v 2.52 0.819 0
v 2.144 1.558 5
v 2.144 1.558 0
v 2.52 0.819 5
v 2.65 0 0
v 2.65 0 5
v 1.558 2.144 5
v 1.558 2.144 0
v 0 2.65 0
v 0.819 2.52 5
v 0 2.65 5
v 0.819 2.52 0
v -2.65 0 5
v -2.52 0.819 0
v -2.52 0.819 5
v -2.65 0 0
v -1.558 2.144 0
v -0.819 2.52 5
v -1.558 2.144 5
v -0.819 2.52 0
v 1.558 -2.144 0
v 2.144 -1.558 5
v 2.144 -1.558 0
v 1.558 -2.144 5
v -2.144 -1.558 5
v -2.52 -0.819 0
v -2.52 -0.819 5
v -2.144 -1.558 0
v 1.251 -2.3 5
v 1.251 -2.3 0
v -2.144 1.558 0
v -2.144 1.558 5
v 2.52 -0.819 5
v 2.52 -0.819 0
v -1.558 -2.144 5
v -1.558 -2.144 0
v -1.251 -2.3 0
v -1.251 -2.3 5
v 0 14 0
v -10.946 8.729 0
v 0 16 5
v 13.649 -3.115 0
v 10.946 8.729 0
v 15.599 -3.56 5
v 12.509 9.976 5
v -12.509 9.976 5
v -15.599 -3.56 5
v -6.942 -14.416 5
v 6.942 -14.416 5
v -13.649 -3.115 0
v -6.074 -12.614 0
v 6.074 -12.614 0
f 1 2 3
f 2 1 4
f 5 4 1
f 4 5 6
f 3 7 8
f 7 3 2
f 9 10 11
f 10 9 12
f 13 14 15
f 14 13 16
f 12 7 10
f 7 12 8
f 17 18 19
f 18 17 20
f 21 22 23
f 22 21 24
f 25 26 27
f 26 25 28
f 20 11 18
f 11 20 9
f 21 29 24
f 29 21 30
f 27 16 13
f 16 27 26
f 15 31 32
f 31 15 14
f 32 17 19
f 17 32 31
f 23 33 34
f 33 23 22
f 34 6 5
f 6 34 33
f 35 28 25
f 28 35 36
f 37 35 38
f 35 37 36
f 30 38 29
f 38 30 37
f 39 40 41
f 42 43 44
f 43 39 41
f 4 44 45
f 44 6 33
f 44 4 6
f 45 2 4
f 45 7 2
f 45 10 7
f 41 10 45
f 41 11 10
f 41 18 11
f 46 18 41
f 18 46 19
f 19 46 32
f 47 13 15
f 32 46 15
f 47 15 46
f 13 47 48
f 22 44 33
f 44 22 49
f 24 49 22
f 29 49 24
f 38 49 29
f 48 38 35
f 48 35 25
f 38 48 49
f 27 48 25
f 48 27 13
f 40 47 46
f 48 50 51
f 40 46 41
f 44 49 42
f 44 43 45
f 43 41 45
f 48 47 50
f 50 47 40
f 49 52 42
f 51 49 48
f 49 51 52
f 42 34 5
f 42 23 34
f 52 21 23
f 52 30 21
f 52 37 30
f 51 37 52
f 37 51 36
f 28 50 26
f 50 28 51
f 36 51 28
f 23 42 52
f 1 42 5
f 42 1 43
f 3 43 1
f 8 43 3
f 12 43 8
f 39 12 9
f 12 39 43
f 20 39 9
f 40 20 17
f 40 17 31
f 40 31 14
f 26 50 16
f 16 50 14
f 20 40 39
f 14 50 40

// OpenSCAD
/*
Knob Factory

Version 1.2

Published at https://www.thingiverse.com/thing:4708988

© 2012 Steve Cooley    ( http://sc-fa.com , http://beatseqr.com , http://hapticsynapses.com )
© 2021 Matthias Ansorg ( https://ma.juii.net )

Description
===========
A parametric OpenSCAD design that allows to generate all kinds of knobs. Examples: small knobs for potentiometer inputs; 
knobs for turning the extruder or an axis of the 3D printer manually; water spout knobs etc.. It's a good idea to print 
only the lower 5 mm at first and then abort the print, to test if the hole diamater fits well on the shaft or if the measures 
have to be tuned further.

Licence
=======
Knob Factory is licensed under a Creative Commons Attribution 3.0 Unported License according to 
the licence note found at https://www.thingiverse.com/thing:20513 . Based on a work at sc-fa.com. 
Permissions beyond the scope of this license may be available at http://sc-fa.com/blog/contact .
You can view the terms of the license here: http://creativecommons.org/licenses/by/3.0/

Version History
===============
1.2  2021-01-03  Option to generate knobs with stems. Major refactorings. Republished as remix on Thingiverse.
1.1  2012-04-12  Fixed the arrow indicator code to be more robust and easier to adjust parameters for.
1.0  2012-03-??  Initial release at https://www.thingiverse.com/thing:20513 .

Open Tasks
==========
* @todo Adjust $fn based on the quality parameter so that if ≥30 faces on the circumference are specified, the shape 
    will be made "round", using the current quality setting.
* @todo Change the assembly order so that the external indicator is not cut by the cone indents even if they cut to the very bottom.
* @todo Add a horizontal cylinder around the setscrew hole, providing sufficient thread length where thin stems walls don't.
* @todo Add support for melt-in nuts that can be used for the setscrew hole, as seen at https://www.thingiverse.com/thing:3475324
* @todo Provide an option to chamfer rather than round along the top, to allow printing without support when flipped over.
* @todo Refactor the top_rounding() module.
* @todo Make the top_rounding() operation faster. Everything else is already fast enough to navigate fluently in preview mode.
* @todo Add a printer_hole_scale parameter (or similar) to scale holes so that printing them offsets any printer calibration 
    error. This keeps local calibration issues separate form the shafthole_radius parameter, which is good for sharing configurations.
* @todo Add support for more shaft shapes (rectangular, gear shaped etc.).
* @todo Support knurling of the knob circumference.
* @todo Add support for cutouts that leave spokes between the hub and circumference.
* @todo Some more "@todo" items as available inside the source code.
* @todo Add a mode where the sphere and cone indents can be rendered, to get an idea how to adapt them if they do not cut anything.
*/


// (1) CUSTOMIZER PARAMETERS
// ======================================================================

/* [Basic Parameters] */
// ---------------------

// Degree of detail in the output to allow faster previews. Influences segments for a full circle. NOT IMPLEMENTED YET.
quality = "preview"; // ["fast preview", "preview", "rendering", "final rendering"]

// Top radius of the main (cylindrical or conical) shape. [mm]
knob_radius_top = 16;

// Bottom radius of the main (cylindrical or conical) shape. [mm]
knob_radius_bottom = 14;

// Height of the main (cylindrical or conical) knob shape, without the stem. [mm]
knob_height = 5;

// Number of faces on the circumference of the knob, as on a regular polygon. ≥30 means "round, using current quality setting".
knob_faces = 7;

// Radius (at the widest point) of the shaft to which the knob is mounted. [mm]
shafthole_radius = 2.65;

// Depth of the hole for the shaft. If the knob is stopped by something mounted to the shaft, you can be generous with this measure, allowing it to catch debris from mounting without stopping the knob before its final position. [mm]
shafthole_height = 12;

// Number of faces on the cylindrical edge of the shaft hole, allowing to create holes for square, hexagonal etc. shafts. ≥30 means "round, using current quality setting".
shafthole_faces = 20;

// How much to cut off to create a D-shaped shafthole cross-section. 0 to keep it round. [mm]
shafthole_cutoff_arc_height = 0.35;


/* [Stem (optional)] */
// --------------------

// Whether to place the knob on a stem to form a mushroom shape.
enable_stem = false;

// Radius of the stem. [mm]
stem_radius = 5;

// Height of the stem. [mm]
stem_height = 10;

// Number of faces on the cylindrical part of the stem. ≥30 means "round, using current quality setting".
stem_faces = 30;

// Height of the section where the stem radius adapts, as part of the stem height. [mm]
stem_transition_height = 5;

// Radius to which the stem radius adapts at the top of the stem. [mm]
stem_transition_radius = 8.8;


/* [Setscrew Hole (optional)] */
// -------------------------

// Create a hole for a set screw, as required by some potentiometer or motor shafts to have their knobs affixed.
enable_setscrew_hole = false;

// Radius of the set screw hole. [mm]
setscrew_hole_radius = 1.01;

// Height of the set screw hole's center over the base of the knob. [mm]
setscrew_hole_height = 4;

// Number of faces on the cylindrical edge of the set screw hole. ≥30 means "round, using current quality setting".
setscrew_hole_faces = 20;


/* [Top Rounding (optional)] */
// ---------------------------------

// Enable rounding of the top edge. (Other "top rounding *" parameters are only relevant if checked.)
enable_top_rounding = false;

// Radius to use for rounding teh top edge. [mm]
top_rounding_radius = 8;

// Cylinder faces to use for the cylinder having the rounded top edge. ≥30 means "round, using current quality setting".
top_rounding_faces = 30;


/* [Engraved Indicator (optional)] */
// -------------------------------

// Whether to create an engraved indicator arrow on the top surface, or not.
enable_engraved_indicator = false;

// Scale factor for the overall arrow size.
engraved_indicator_scale = 1.01;

// Scale factor for the arrow's head size.
engraved_indicator_head_scale = 2.1;

// Scale factor for the arrow's shaft size.
engraved_indicator_shaft_scale = 1.5;

// How much to move the arrow into its pointing direction. Positive or negative. [mm]
engraved_indicator_move_forward = 3.1;

// Engraving depth. [mm]
engraved_indicator_depth = 4.2;


/* [External Indicator (optional)] */
// ------------------------------

// Whether to create a dial, protruding from the bottom of the knob's circumference.
enable_external_indicator = false;

// Height of the dialhand, from the bottom of the knob body. [mm]
external_indicator_height = 11;

// Length of the dialhand protruding over the bottom radius of the knob main shape. [mm]
external_indicator_length = 3;


/* [Sphere Indents (optional)] */
// --------------------------------------

// Whether to create cutouts around the top edge or circumference using spheres (or rather regular polyhedra) arranged in a circle.
enable_sphere_indents = false;

// Number of indenting spheres.
sphere_indents_count = 7;

// Radius of the indenting spheres. [mm]
sphere_indents_radius = 3;

// Number of faces around the outer circumference of the indenting spheres. ≥30 means "round, using current quality setting".
sphere_indents_faces = 16;

// Distance of the indenting spheres' centers from the centerline of the knob. [mm]
sphere_indents_center_distance = 12;

// Maximum depth cut by the indenting spheres, measured from the top surface of the knob. [mm]
sphere_indents_cutdepth = 3;

// Rotation offset of all spheres. Allows to align the indentations with the indicator, setscrew or outer faces. [degrees]
sphere_indents_offset_angle = 0;


/* [Cone Indents (optional)] */
// ------------------------------------

// Whether to create cutouts around the top edge or circumference using cones or cylinders arranged in a circle. When using many narrow cylinders you can create a serrating effect for better grip on the circumference surface.
enable_cone_indents = false;

// Number of indenting cones.
cone_indents_count = 7;

// Number of faces around the outer circumference of the indenting cones. ≥30 means "round, using current quality setting".
cone_indents_faces = 30;

// Height of the indenting cones. [mm]
cone_indents_height = 5.1;

// Top radius of the indenting cones. [mm]
cone_indents_top_radius = 3.1;

// Bottom radius of the indenting cones. [mm]
cone_indents_bottom_radius = 7.2;

// Distance of the indenting cones' centerlines from the centerline of the knob. [mm]
cone_indents_center_distance = 16.1;

// Maximum depth cut by the indenting cones, measured from the top surface of the knob. [mm]
cone_indents_cutdepth = 5.1;

// Rotation offset of all cones. Allows to align the indentations with the indicator, setscrew or outer faces. [degrees]
cone_indents_offset_angle = 0;


// (2) FIXED AND DERIVED MEASURES
// ======================================================================

// Prevent anything following from showing up as Customizer parameters.
/* [Hidden] */

// Small amount of overlap for unions and differences, to prevent z-fighting.
nothing = 0.01;

// Degrees per fragment of a circle. Used only where users want round outlines by specifying ≥30 faces.
$fa =   
    (quality == "final rendering") ? 1 :
    (quality == "rendering") ? 3 : 
    (quality == "preview") ? 6 :
    (quality == "fast preview") ? 12 : 12; // The OpenSCAD default.
      
// Minimum size of circle fragments in mm.
$fs = 
    (quality == "final rendering") ? 0.1 :
    (quality == "rendering") ? 0.25 : 
    (quality == "preview") ? 0.5 :
    (quality == "fast preview") ? 2 : 2; // The OpenSCAD default.


// (3) MAIN MODULE
// ======================================================================

knob(); // Entry point of the program.


module knob() {
	difference() {
		difference() { 
            difference() {
				difference() {
					union() {
						translate([0, 0, enable_stem ? stem_height : 0]) {
                            difference() {
                                knob_base();
                                if (enable_top_rounding) top_rounding();
                            }
                            if (enable_external_indicator) external_indicator();
                        }
                        if (enable_stem) stem();
					}
					shafthole();
				}
				if (enable_setscrew_hole) setscrew_hole();
			}
			if (enable_engraved_indicator) engraved_indicator();
			if (enable_sphere_indents) sphere_indents();
            if (enable_cone_indents) cone_indents();
		}
	}
}


// (4) SUBMODULES
// ======================================================================

module knob_base() {
    // Align a face with the setscrew hole for aesthetic reasons, providing an arc above the setscrew hole in case of a round 
    // stem base and polygonal widening part of the stem. In OpenSCAD, polygons ("cylinders") are created so that a corner 
    // is placed on the +x axis. For uneven corner numbers, naturally a face is then centered around the -x axis. By rotating +90°, 
    // we move that face to be centered around the -y axis, where the setscrew hole has to be placed because it is the "back".
    rotate([0, 0, 90])
        // Knob base shape without any modifications or additions.
        cylinder(r1 = knob_radius_bottom, r2 = knob_radius_top, h = knob_height, $fn = knob_faces);
}

// @todo Calculate the convexity values based on the number of sphere and cone indents. Because a higher-than-necessary value 
//   hurts preview mode performance.
module top_rounding() {
    // Thanks to http://www.iheartrobotics.com/ for the articles that helped implement this.
    
    ct = -0.1;                          // circle translate? not sure.
    circle_radius = knob_radius_top;  	// just match the top edge radius
    circle_height = 1; 					// actually.. I don't know what this does.
    pad = 0.2;							// Padding to maintain manifold
    
    render(convexity = 5)
        translate([0, 0, knob_height])
            rotate([180, 0, 0])
                difference() {
                    rotate_extrude(convexity = 5, $fn = top_rounding_faces)
                        translate([circle_radius - ct - top_rounding_radius + pad, ct - pad, 0])
                            square(top_rounding_radius + pad, top_rounding_radius + pad);

                    rotate_extrude(convexity = 5, $fn = top_rounding_faces)
                        translate([circle_radius - ct - top_rounding_radius, ct + top_rounding_radius, 0])
                            circle(r = top_rounding_radius, $fn = top_rounding_faces);
                }
}


module stem() {
    // Straight basic stem.
    cylinder(h = stem_height + nothing, r = stem_radius, $fn = stem_faces);
    
    // Widening part at the top.
    rotate([0, 0, 90]) // To align a face with the setscrew hole; see knob_base().
        translate([0, 0, stem_height - stem_transition_height])
            cylinder(h = stem_transition_height, r1 = stem_radius, r2 = stem_transition_radius, $fn = knob_faces);
}


module shafthole() {
    difference() {
        // Create a round shafthole base shape.
        translate([0, 0, -1])
            cylinder(r = shafthole_radius, h = shafthole_height, $fn = shafthole_faces);
        
        // Adapt to a D-shaped shafthole if desired.
        if(shafthole_cutoff_arc_height != 0) {
            cutoff_size = [
                2 * shafthole_radius + 2 * nothing,
                shafthole_cutoff_arc_height + 2 * nothing,
                shafthole_height + 2 * nothing
            ];
            translate([-nothing, shafthole_cutoff_arc_height/2 - shafthole_radius - nothing, shafthole_height / 2]) 
                cube(cutoff_size, center = true);
        }
    }
}


module setscrew_hole() {
    hole_depth = max(knob_radius_top, knob_radius_bottom, stem_radius) + nothing;
    
    translate([0, -hole_depth / 2, setscrew_hole_height])
        rotate([90, 0, 0])
            cylinder(r = setscrew_hole_radius, h = hole_depth, center = true, $fn = setscrew_hole_faces);
}


// @todo Refactor the scaling algorithm and parameters to be more understandable. Default scale should be 1.
// @todo Fix that engraved_indicator_depth has not yet the desired effect because it is scaled with the rest of the arrow.
module engraved_indicator() {
    translate([0, engraved_indicator_move_forward, knob_height + (enable_stem ? stem_height : 0)])
        rotate([90, 0, 45])
            scale([engraved_indicator_scale * 0.3, engraved_indicator_scale * 0.3, engraved_indicator_scale * 0.3])
    
                union() {
                    rotate([90, 45, 0])
                        scale([engraved_indicator_head_scale, engraved_indicator_head_scale, 1])
                            // Arrowhead triangle as a cylinder with 3 faces.
                            cylinder(r = 8, h = engraved_indicator_depth * 2, $fn = 3, center = true);
                    rotate([90, 45, 0])
                        translate([-10, 0, 0])
                            scale([engraved_indicator_shaft_scale, engraved_indicator_shaft_scale, 1])
                                cube(size = [15, 10, engraved_indicator_depth * 2], center = true);
                }
}


module external_indicator() {
    // The diagonal of the square used as indicator is sqrt(2*knob_radius_bottom²). First we move it back from that 
    // most outward position to point at the center, then to point at the circumference of the knob, then to point out as specified.
    translate([0, -sqrt(2 * knob_radius_bottom * knob_radius_bottom) + knob_radius_bottom + external_indicator_length, 0])
        rotate([0, 0, 45])
            cube([knob_radius_bottom, knob_radius_bottom, external_indicator_height], center = false);
}


module sphere_indents() {
    z_position = sphere_indents_radius + (enable_stem ? stem_height : 0) + knob_height - sphere_indents_cutdepth;
    
    for (z = [0 : sphere_indents_count]) {
        // 90° base rotation angle to align the spheres with corners of the base shape. See knob_base().
        rotate([0, 0, 90 + sphere_indents_offset_angle + ((360 / sphere_indents_count) * z)])
            translate([sphere_indents_center_distance, 0, z_position])
                sphere(r = sphere_indents_radius, $fn = sphere_indents_faces); 
    }
}


module cone_indents() {
    height = cone_indents_height + 2 * nothing;
    z_position = height / 2 + (enable_stem ? stem_height : 0) + knob_height - cone_indents_cutdepth;
    
    for (z = [0 : cone_indents_count]) {
        // 90° base rotation angle to align the cones with corners of the base shape. See knob_base().
        rotate([0, 0, 90 + cone_indents_offset_angle + ((360 / cone_indents_count) * z)])
            translate([cone_indents_center_distance, 0, z_position - nothing])
                cylinder(
                    r1 = cone_indents_bottom_radius,
                    r2 = cone_indents_top_radius,
                    h = height,
                    center = true,
                    $fn = cone_indents_faces
                );
    }
}
